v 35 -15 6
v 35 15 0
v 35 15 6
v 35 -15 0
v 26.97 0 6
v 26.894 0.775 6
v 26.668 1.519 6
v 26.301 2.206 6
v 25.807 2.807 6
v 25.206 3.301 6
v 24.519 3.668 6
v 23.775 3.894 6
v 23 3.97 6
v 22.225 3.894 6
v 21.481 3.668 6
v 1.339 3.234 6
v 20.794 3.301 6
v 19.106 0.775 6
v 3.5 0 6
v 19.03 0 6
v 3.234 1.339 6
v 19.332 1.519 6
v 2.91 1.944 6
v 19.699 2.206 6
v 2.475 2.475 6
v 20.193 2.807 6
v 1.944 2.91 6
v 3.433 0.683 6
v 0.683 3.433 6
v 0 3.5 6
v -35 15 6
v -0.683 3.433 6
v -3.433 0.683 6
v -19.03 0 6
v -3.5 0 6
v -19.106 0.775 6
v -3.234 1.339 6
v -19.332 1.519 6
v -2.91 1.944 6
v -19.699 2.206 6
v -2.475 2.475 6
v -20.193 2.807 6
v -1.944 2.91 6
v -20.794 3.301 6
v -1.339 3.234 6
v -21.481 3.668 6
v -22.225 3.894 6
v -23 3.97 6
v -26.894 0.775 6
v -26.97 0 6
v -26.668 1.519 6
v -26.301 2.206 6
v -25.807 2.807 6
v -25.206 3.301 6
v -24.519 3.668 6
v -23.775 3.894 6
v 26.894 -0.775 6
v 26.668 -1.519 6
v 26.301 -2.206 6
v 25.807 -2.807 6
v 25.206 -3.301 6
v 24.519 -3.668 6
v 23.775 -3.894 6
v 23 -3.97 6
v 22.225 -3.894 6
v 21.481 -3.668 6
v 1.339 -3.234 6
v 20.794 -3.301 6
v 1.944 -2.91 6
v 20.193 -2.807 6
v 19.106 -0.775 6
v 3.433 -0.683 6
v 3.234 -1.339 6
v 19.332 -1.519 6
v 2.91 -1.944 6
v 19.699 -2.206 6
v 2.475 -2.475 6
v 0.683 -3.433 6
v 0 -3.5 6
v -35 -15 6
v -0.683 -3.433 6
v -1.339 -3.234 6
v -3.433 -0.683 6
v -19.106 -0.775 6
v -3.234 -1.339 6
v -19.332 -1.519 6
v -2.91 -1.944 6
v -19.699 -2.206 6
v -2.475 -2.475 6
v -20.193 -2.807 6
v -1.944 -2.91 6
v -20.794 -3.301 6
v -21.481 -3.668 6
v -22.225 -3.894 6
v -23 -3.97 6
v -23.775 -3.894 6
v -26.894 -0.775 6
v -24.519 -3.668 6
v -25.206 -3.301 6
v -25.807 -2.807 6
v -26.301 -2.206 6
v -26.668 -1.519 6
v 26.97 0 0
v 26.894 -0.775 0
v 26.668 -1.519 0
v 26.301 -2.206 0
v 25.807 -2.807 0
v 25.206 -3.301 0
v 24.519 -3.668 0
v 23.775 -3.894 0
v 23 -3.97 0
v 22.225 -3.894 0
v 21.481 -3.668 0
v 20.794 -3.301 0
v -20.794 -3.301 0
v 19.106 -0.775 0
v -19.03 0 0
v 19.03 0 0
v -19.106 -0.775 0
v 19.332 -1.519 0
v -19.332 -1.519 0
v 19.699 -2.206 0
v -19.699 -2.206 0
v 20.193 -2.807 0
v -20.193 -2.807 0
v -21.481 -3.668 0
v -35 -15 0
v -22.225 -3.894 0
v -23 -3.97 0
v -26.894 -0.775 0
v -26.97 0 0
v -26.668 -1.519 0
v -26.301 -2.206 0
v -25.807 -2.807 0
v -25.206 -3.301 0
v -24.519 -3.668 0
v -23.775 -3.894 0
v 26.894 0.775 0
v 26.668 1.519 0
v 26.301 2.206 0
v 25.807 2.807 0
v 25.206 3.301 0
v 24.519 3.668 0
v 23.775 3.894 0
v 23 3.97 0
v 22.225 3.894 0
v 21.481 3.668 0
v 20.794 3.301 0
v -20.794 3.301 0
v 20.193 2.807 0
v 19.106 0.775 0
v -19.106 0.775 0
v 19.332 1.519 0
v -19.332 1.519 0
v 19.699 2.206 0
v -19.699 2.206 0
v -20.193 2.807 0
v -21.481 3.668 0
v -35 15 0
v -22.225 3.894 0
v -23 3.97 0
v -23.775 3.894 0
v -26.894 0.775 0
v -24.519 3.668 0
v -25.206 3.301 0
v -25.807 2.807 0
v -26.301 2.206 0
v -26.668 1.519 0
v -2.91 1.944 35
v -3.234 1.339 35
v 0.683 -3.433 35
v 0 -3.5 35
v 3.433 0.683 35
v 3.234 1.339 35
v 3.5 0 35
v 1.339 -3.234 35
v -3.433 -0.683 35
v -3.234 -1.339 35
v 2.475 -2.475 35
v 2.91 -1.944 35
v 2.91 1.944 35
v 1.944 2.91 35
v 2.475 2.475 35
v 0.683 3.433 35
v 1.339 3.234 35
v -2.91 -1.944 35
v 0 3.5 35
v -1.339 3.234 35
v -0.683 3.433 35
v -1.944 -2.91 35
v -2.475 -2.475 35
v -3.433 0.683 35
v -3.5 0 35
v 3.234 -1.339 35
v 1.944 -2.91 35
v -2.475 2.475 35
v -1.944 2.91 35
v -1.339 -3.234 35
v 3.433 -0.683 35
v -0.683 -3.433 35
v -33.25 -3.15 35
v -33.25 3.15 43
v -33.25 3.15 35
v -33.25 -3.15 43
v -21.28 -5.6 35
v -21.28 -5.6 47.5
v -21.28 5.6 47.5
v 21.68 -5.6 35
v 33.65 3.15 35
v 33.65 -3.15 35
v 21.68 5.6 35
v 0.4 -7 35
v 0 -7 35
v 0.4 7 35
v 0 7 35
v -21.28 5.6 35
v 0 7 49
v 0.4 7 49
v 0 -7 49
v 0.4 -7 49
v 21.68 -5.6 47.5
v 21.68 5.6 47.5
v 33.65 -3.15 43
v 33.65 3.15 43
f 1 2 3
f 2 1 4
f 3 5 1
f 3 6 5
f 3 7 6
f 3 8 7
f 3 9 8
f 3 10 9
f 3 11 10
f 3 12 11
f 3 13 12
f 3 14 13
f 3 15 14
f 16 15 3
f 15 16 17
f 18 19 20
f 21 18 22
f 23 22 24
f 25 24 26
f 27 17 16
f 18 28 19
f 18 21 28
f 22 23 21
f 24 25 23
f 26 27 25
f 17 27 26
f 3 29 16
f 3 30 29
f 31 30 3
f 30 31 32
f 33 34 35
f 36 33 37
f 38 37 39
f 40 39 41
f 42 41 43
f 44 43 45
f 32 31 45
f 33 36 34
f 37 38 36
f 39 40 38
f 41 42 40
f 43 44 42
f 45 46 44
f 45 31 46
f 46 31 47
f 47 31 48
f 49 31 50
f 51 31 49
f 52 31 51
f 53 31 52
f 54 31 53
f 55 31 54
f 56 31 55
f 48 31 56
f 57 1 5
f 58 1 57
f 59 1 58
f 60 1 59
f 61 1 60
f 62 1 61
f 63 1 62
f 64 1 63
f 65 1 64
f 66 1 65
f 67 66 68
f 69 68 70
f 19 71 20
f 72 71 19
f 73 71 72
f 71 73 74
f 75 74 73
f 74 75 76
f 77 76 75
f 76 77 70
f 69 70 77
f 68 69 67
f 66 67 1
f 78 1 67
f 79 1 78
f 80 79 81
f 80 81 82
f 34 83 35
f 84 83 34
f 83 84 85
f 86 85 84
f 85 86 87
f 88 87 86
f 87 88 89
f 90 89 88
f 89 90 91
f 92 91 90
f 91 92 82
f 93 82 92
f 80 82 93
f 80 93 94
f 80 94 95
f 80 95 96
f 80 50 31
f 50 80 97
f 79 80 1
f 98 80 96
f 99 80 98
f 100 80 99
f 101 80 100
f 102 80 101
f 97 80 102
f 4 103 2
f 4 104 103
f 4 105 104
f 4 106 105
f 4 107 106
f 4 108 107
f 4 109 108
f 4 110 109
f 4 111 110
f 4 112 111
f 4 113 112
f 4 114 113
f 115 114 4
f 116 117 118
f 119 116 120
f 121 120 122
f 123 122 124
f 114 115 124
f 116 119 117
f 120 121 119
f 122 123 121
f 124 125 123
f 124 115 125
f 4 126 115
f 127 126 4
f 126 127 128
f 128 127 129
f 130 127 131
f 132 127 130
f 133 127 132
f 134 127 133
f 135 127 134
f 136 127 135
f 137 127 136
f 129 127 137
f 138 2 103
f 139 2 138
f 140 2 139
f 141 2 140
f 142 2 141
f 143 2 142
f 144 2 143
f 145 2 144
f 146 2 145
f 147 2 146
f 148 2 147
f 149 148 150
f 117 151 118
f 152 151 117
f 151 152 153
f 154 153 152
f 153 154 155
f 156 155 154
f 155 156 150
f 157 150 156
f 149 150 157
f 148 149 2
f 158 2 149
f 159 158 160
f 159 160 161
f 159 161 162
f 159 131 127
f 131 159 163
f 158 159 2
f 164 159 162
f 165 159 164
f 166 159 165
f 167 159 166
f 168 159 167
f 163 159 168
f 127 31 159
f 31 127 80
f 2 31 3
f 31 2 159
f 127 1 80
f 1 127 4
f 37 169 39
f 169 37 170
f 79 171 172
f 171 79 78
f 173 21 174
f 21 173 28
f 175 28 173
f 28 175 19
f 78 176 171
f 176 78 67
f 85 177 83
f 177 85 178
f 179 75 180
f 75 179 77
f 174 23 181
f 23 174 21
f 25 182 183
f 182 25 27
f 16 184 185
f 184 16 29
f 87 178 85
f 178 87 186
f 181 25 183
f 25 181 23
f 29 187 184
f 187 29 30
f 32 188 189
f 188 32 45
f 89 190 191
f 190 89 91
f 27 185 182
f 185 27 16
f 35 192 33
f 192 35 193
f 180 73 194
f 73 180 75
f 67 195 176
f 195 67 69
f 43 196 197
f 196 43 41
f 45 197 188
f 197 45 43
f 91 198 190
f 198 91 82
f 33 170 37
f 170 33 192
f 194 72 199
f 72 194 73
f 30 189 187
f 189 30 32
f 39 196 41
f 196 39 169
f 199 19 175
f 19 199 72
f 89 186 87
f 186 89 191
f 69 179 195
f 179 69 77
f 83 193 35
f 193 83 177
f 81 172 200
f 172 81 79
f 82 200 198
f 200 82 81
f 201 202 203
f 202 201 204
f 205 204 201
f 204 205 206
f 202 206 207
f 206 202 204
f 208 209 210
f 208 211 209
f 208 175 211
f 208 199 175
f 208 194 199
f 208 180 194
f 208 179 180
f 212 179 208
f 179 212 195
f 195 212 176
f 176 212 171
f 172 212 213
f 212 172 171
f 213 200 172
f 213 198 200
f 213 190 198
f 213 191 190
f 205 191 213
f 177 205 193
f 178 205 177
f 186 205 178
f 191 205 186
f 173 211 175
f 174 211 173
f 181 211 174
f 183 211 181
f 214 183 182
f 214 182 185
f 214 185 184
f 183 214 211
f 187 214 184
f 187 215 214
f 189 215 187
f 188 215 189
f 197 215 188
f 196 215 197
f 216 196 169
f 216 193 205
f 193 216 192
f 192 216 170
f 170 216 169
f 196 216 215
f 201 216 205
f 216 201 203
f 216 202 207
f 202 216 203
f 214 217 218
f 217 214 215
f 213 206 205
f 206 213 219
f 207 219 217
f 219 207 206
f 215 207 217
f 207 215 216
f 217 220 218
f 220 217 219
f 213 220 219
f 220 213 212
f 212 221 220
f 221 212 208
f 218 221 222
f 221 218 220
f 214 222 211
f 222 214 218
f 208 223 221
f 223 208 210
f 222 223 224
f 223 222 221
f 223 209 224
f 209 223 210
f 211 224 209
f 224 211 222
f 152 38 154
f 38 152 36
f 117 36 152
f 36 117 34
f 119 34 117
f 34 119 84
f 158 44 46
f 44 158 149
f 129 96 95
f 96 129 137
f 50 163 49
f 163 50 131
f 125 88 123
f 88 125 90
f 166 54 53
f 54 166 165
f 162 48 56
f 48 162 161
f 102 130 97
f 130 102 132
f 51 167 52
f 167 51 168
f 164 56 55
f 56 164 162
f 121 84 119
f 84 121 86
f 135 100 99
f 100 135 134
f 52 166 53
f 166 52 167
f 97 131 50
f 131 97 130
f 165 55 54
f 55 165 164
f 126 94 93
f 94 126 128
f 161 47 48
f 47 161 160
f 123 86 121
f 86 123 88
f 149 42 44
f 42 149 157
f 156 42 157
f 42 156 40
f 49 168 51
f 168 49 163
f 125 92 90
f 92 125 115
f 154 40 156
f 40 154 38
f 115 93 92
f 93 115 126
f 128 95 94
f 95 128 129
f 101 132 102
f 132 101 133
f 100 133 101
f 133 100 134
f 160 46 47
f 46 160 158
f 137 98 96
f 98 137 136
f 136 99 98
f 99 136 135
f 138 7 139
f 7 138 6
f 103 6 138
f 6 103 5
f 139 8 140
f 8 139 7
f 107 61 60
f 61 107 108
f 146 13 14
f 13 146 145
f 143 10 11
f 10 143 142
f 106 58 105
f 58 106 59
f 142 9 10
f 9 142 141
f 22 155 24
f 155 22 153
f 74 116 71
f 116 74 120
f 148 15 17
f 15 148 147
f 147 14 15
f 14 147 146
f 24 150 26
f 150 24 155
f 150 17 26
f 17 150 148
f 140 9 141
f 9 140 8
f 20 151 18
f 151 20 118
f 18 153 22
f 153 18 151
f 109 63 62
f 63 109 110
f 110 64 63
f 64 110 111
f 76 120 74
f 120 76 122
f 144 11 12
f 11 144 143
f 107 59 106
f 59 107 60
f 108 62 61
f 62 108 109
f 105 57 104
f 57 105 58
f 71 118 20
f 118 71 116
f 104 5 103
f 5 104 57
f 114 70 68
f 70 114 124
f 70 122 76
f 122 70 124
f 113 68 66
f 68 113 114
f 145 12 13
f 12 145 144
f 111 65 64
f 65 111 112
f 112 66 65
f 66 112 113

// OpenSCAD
$fn = 32;

// ----------------------------------------------------------------------
// Boat cleat: 70 mm base, horn 42 mm up
// ----------------------------------------------------------------------

// --- parameters (mm) ---
base_l = 70;              // base length
base_w = 30;              // base width
base_t = 6;               // base thickness
horn_len = 66.5;          // horn length
horn_d = 14;              // horn diameter at the middle
horn_z = 42;              // horn axis height
end_drop = 6;             // how far the horn tips drop
post_d = 7;               // centre post diameter
holes_d = 7.94;           // fixing holes
hole_x = 23;              // fixing hole spacing

difference() {
  union() {
    translate([-35, -15, 0]) cube([base_l, base_w, base_t]);
    /* centre post, sunk 1 mm into the base */
    translate([0, 0, 5]) cylinder(h = 37, d = post_d);
    /* horn: a hull chain of boxes, full in the middle and lighter at the tips */
    hull() {
      translate([-33.25, -3.15, 35]) cube([0.4, 6.3, 8], center = false);
      translate([-21.28, -5.6, 35]) cube([0.4, 11.2, 12.5], center = false);
    }
    hull() {
      translate([-21.28, -5.6, 35]) cube([0.4, 11.2, 12.5], center = false);
      translate([0, -7, 35]) cube([0.4, 14, 14], center = false);
    }
    hull() {
      translate([0, -7, 35]) cube([0.4, 14, 14], center = false);
      translate([21.28, -5.6, 35]) cube([0.4, 11.2, 12.5], center = false);
    }
    hull() {
      translate([21.28, -5.6, 35]) cube([0.4, 11.2, 12.5], center = false);
      translate([33.25, -3.15, 35]) cube([0.4, 6.3, 8], center = false);
    }
  }
  translate([-23, 0, -2.5]) cylinder(h = base_t + 5, d = holes_d);
  translate([23, 0, -2.5]) cylinder(h = base_t + 5, d = holes_d);
}
